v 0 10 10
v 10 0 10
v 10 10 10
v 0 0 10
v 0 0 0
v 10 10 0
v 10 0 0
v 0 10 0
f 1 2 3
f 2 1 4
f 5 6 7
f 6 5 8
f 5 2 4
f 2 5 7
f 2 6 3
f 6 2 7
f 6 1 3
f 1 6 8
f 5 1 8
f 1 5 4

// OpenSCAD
objects = 4; //[2, 4, 6]
side = 4; //[]
cube_pos = [5, 5, 5]; //[]
cube_size = 5; //[]
text = "customize me!"; //[customize me!, Thank you!]
sidel = 10; //[0, 10, 20]

cube(size = [sidel, 10, 10]);
